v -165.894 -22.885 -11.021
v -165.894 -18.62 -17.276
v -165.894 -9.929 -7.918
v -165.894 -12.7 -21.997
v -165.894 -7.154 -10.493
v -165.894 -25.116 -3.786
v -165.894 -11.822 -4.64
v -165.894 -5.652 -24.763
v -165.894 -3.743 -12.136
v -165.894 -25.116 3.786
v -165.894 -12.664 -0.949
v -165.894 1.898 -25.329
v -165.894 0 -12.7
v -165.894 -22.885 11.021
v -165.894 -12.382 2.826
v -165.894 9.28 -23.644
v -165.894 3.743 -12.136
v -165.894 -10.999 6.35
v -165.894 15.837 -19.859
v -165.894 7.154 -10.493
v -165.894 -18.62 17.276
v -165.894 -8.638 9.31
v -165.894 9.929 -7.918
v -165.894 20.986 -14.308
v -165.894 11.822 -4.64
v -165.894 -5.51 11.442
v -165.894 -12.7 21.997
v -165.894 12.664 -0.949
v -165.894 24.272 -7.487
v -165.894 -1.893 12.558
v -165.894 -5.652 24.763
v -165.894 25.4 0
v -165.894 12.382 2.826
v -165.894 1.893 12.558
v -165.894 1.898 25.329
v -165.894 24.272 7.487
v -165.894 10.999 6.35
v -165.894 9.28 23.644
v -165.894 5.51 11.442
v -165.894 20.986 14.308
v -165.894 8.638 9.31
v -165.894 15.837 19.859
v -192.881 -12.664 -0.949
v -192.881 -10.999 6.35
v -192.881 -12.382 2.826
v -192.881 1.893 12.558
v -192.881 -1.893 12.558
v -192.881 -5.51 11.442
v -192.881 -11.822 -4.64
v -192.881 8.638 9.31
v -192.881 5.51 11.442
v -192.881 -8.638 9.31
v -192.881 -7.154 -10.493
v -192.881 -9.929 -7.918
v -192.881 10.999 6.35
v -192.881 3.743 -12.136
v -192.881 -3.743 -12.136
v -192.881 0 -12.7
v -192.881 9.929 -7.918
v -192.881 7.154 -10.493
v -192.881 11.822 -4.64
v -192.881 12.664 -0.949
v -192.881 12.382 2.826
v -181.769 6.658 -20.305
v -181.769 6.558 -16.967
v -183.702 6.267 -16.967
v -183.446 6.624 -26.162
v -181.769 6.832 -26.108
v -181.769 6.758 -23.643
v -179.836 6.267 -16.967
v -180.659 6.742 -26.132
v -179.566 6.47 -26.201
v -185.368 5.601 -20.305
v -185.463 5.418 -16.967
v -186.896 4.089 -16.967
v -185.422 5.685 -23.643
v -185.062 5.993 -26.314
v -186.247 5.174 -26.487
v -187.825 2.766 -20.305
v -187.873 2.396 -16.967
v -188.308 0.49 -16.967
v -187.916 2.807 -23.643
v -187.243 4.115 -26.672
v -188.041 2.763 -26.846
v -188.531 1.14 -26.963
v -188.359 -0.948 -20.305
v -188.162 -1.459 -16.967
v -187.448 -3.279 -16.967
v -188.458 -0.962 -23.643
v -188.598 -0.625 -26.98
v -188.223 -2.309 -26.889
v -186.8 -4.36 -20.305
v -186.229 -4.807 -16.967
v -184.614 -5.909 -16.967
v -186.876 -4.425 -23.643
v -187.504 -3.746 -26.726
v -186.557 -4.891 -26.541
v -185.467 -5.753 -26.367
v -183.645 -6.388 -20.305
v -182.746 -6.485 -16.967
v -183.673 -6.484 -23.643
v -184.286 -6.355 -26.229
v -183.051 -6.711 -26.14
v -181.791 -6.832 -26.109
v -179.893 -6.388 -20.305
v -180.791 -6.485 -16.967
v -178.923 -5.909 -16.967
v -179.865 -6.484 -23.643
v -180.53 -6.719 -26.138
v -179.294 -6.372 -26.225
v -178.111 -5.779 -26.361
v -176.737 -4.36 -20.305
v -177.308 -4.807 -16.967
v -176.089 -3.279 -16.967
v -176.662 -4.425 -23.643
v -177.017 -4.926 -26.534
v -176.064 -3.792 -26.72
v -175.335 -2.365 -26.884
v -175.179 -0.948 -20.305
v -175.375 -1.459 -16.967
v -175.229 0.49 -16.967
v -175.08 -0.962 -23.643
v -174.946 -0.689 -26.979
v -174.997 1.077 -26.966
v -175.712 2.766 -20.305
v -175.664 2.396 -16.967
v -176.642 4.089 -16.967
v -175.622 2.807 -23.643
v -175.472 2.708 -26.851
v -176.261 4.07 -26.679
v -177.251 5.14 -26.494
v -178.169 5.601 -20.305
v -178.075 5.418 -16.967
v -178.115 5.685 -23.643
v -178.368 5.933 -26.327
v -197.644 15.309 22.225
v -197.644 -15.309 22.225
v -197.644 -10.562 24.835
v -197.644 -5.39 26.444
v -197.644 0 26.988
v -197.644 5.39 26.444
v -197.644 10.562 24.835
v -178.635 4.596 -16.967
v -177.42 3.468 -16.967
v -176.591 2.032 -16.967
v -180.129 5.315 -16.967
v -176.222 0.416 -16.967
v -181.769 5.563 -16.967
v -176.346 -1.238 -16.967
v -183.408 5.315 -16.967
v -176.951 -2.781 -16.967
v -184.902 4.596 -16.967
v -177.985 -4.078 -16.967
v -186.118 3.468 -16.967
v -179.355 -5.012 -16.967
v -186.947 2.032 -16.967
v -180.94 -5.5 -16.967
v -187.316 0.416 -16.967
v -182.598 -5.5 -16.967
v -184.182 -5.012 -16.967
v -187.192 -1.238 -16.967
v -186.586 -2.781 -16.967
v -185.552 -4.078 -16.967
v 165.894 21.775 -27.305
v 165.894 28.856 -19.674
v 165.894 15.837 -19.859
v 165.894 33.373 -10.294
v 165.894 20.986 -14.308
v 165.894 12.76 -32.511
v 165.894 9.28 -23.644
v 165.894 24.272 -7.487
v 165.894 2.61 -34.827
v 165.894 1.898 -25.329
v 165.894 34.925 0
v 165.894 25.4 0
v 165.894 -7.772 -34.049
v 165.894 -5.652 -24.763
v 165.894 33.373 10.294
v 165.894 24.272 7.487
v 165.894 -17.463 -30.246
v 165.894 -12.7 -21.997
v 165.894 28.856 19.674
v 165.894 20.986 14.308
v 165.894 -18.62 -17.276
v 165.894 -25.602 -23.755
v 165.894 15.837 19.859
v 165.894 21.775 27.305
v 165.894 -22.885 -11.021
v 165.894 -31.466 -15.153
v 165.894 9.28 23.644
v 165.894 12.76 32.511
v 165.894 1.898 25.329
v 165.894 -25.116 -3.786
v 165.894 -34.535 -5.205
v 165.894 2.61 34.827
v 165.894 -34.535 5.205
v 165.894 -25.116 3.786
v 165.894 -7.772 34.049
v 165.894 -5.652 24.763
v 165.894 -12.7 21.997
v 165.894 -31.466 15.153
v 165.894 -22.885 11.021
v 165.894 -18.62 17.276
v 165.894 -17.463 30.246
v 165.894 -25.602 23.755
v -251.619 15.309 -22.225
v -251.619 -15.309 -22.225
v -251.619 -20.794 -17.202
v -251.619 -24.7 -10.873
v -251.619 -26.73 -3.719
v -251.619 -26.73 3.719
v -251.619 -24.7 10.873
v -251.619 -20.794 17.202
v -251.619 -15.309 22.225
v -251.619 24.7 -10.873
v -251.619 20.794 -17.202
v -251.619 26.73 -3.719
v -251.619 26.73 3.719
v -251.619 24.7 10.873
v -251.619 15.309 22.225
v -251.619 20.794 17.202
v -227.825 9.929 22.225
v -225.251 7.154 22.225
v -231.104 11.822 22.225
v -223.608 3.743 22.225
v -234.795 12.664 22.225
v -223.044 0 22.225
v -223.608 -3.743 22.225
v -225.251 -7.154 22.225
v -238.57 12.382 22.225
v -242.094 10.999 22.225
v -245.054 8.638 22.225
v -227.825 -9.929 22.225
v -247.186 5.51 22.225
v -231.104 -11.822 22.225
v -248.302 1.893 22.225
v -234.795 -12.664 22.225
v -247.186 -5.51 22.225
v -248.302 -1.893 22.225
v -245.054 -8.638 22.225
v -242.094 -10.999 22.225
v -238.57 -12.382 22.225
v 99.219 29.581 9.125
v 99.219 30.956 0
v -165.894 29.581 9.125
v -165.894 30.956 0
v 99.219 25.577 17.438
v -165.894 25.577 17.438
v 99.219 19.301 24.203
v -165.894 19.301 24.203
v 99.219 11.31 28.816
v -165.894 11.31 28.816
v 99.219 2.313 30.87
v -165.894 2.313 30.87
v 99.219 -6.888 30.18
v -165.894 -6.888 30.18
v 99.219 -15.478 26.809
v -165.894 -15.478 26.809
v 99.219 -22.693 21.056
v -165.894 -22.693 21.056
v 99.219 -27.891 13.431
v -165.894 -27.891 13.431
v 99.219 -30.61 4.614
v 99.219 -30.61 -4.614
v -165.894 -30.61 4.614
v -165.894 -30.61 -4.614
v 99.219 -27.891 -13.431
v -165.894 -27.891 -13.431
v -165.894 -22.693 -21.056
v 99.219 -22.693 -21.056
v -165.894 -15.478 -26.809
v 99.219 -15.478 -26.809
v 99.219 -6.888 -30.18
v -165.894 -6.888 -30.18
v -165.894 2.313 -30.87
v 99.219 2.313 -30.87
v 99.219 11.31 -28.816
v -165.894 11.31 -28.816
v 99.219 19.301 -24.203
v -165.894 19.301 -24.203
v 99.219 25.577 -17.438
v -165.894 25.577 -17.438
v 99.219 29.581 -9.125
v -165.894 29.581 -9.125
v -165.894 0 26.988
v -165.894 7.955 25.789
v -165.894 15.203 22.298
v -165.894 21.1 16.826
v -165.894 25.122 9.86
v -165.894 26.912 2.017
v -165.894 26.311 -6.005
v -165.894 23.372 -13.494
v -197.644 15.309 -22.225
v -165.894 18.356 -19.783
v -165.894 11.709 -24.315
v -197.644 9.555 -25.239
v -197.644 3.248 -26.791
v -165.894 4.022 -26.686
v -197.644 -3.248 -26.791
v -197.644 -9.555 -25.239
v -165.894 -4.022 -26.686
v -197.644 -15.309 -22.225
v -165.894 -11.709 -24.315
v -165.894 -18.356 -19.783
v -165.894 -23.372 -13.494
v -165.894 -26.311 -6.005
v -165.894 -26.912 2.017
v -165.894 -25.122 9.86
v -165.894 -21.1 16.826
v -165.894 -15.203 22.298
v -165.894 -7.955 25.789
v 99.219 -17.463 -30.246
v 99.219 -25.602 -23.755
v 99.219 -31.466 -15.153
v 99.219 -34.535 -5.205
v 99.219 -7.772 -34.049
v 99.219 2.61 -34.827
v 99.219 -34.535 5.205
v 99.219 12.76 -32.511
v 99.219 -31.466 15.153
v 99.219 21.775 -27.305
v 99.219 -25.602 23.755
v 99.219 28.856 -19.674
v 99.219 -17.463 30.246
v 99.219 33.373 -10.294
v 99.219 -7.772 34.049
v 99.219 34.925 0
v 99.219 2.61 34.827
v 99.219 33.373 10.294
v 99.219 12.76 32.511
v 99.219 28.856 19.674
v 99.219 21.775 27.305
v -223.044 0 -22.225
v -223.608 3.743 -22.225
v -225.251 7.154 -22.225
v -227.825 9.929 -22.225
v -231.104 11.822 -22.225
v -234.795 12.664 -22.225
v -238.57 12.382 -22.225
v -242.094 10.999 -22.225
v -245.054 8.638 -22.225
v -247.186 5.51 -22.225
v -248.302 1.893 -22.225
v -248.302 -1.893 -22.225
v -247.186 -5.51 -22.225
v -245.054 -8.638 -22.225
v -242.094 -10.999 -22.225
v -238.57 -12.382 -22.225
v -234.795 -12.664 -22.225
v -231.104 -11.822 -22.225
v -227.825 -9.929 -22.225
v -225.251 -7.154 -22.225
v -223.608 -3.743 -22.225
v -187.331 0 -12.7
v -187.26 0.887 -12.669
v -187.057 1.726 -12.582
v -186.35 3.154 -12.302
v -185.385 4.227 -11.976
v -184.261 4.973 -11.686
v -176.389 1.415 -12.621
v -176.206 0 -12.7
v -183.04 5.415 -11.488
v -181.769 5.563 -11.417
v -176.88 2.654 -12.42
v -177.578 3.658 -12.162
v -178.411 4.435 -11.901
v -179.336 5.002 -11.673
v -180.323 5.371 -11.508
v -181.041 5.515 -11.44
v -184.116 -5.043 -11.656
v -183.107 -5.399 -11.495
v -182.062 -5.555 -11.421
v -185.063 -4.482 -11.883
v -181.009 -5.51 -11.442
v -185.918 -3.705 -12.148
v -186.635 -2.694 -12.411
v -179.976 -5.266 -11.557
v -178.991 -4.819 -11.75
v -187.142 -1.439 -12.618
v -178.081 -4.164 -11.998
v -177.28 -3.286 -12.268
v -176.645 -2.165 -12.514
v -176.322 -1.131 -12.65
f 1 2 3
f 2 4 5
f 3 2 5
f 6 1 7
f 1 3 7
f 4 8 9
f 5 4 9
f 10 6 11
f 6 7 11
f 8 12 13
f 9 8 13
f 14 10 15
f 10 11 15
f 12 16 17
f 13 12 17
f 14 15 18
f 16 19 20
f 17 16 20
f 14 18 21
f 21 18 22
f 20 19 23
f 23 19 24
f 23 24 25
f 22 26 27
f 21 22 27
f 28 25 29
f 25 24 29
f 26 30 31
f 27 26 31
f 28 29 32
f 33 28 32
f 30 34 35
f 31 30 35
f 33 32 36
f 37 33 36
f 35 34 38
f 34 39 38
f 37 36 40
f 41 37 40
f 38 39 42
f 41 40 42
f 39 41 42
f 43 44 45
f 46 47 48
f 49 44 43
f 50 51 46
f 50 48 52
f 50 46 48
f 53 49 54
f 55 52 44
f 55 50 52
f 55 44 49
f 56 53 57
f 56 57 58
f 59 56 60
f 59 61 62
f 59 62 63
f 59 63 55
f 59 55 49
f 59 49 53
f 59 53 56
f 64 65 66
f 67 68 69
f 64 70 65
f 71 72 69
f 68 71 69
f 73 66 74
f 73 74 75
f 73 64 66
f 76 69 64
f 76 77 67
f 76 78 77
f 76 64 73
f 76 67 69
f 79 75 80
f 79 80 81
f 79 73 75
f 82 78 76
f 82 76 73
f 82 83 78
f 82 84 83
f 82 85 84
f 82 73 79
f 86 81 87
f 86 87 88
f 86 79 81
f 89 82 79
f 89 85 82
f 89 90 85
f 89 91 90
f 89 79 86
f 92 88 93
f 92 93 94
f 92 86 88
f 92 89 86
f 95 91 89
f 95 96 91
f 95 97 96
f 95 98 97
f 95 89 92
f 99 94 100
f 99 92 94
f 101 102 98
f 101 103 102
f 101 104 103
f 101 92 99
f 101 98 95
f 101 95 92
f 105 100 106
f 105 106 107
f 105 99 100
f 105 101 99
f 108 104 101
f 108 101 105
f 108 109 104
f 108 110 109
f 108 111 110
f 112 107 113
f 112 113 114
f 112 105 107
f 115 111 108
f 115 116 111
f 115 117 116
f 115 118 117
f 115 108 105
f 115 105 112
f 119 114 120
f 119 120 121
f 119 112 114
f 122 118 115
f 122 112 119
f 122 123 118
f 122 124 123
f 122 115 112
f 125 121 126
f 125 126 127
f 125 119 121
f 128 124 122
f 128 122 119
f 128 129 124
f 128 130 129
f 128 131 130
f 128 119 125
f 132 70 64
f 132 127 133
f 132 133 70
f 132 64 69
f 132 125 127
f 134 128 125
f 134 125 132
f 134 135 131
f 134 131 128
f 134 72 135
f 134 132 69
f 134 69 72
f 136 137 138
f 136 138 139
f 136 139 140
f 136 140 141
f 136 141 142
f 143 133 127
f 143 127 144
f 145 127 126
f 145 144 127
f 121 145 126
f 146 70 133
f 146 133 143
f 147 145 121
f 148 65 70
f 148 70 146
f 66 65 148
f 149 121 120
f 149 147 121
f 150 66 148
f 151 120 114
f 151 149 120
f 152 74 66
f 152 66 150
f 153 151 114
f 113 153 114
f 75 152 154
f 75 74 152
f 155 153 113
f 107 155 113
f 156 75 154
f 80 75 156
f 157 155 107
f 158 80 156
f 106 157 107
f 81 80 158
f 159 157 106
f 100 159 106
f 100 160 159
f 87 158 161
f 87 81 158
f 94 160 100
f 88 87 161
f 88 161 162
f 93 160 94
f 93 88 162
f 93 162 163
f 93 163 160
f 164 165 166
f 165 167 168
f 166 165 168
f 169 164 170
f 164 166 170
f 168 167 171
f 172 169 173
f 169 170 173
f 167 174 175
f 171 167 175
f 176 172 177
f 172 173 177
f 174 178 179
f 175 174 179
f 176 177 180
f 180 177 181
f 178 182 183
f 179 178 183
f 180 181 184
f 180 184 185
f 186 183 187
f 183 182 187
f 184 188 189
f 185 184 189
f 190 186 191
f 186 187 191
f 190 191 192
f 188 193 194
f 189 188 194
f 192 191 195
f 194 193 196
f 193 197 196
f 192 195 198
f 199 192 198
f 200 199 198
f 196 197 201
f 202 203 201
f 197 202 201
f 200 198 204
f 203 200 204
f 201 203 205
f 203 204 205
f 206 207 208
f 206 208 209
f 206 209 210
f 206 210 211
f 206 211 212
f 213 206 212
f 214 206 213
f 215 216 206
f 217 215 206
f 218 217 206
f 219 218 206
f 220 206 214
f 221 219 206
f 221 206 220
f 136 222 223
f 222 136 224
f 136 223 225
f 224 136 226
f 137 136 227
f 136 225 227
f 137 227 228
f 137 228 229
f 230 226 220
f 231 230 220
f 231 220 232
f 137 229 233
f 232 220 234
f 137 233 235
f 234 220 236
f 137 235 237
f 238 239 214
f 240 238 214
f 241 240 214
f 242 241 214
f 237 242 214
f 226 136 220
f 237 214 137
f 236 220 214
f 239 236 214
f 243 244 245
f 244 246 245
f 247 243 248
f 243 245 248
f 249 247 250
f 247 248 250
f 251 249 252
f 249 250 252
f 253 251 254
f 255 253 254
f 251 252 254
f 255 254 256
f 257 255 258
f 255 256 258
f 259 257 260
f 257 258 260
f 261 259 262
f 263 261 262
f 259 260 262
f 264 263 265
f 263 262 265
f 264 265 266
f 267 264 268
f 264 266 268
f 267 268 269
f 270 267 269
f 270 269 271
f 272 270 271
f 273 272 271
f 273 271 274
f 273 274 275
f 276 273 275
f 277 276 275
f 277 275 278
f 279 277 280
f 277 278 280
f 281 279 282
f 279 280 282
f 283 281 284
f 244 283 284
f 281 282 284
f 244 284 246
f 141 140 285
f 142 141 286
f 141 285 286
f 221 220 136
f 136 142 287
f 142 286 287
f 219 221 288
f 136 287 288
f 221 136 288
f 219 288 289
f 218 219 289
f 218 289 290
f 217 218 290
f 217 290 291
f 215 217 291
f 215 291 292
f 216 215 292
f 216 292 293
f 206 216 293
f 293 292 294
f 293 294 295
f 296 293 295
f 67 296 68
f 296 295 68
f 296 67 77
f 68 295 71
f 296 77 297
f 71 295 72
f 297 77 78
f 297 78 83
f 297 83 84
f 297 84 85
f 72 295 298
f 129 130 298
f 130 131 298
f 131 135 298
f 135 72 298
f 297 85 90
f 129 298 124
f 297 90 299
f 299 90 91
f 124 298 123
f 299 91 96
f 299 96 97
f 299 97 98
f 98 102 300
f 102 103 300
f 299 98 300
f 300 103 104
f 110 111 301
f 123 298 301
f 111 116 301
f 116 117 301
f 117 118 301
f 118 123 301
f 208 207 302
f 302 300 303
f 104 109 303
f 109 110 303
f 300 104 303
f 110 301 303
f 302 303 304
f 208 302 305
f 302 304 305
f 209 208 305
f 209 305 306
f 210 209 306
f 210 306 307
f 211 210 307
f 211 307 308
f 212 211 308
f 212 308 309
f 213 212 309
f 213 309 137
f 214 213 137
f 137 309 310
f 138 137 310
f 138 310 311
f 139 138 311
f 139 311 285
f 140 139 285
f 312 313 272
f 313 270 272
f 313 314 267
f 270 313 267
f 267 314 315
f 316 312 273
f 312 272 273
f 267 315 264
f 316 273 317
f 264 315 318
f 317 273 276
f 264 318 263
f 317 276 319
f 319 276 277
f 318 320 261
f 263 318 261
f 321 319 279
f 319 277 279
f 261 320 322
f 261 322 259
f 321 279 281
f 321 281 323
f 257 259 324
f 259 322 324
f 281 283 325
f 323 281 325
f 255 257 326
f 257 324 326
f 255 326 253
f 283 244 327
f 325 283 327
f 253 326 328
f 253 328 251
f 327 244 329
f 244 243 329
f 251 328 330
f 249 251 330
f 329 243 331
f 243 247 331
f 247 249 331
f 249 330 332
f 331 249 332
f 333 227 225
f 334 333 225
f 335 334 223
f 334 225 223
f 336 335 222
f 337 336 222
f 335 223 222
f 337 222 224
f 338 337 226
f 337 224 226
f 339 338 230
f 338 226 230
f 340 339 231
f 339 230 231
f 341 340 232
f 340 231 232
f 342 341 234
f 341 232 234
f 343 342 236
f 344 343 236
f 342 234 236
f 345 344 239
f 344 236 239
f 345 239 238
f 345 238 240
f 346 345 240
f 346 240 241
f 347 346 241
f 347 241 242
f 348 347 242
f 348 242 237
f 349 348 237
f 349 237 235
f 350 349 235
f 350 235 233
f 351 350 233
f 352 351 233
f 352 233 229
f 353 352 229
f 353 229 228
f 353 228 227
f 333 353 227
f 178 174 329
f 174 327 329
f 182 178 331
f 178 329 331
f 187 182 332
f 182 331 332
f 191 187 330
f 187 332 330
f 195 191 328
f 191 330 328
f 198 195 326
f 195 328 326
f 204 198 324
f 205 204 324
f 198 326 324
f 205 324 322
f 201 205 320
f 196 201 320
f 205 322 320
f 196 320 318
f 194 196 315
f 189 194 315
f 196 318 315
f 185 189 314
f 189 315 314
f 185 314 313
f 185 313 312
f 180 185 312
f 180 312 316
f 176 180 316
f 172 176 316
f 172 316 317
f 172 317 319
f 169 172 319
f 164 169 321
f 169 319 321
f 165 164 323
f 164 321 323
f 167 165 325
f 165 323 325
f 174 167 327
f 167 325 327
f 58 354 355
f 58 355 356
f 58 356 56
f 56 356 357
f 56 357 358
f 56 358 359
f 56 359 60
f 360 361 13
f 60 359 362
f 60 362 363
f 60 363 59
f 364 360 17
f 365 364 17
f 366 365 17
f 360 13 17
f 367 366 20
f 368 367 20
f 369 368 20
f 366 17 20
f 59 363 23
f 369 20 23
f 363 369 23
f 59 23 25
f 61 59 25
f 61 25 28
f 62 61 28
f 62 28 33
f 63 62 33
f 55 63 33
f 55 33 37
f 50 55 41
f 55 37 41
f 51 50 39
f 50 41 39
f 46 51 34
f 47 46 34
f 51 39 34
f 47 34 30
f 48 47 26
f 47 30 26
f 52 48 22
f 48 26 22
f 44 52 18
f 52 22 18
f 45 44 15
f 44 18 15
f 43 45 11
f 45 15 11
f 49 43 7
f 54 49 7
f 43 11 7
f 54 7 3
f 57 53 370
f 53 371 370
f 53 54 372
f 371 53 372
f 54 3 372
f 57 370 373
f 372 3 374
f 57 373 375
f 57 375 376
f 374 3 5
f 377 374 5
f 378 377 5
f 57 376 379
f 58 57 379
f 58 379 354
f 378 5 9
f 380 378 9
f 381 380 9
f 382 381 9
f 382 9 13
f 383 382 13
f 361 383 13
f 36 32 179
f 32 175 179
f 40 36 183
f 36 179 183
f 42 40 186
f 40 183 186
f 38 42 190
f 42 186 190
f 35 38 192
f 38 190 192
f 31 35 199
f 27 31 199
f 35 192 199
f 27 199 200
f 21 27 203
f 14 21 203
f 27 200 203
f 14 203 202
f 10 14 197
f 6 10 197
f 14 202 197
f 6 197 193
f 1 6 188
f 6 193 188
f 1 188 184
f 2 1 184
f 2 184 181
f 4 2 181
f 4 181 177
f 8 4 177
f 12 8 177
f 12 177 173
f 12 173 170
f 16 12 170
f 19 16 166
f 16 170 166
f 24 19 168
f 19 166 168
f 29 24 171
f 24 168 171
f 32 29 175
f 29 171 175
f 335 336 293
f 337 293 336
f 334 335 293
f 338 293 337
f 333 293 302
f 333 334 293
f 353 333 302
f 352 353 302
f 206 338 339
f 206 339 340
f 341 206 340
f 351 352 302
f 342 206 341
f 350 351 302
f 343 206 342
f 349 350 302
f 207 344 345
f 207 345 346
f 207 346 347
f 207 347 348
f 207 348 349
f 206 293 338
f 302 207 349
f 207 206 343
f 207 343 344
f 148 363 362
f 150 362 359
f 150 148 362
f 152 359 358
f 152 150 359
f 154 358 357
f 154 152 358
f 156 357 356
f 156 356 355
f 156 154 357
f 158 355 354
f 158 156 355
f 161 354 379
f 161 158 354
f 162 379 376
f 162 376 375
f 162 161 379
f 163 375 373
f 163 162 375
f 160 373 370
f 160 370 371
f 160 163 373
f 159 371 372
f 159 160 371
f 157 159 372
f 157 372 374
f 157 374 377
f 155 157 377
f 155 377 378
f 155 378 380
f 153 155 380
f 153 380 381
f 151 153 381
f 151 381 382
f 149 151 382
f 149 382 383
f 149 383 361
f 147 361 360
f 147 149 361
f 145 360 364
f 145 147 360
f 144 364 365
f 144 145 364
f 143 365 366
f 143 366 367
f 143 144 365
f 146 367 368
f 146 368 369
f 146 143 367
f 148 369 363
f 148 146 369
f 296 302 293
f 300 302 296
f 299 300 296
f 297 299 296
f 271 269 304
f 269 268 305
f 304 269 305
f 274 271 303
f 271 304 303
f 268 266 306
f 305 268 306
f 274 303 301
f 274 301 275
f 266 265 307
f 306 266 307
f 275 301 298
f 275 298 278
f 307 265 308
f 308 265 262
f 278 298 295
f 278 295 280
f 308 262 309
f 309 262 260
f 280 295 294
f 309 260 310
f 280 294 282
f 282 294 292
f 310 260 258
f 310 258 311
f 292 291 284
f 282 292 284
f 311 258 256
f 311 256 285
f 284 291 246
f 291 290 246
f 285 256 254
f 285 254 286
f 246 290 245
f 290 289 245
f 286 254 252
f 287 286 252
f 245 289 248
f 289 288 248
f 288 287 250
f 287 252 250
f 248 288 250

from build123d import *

# Parameters (mm, degrees)
SKETCH2_R           = 26.9875
BOSS_EXTRUDE1_DEPTH = 85.725
CUT_EXTRUDE1_DEPTH  = 53.975
SKETCH4_R           = 12.7
CUT_EXTRUDE2_DEPTH  = 58.15
SKETCH8_R           = 12.7
CUT_EXTRUDE3_DEPTH  = 26.9875


with BuildPart() as part:
    # Sketch1 → Revolve1 (revolve)
    with BuildSketch(Plane.XY):
        Polygon((165.89375, 34.925), (99.21875, 34.925), (99.21875, 30.95625), (-165.89375, 30.95625), (-165.89375, 25.4), (165.89375, 25.4), align=None)
    revolve(axis=Axis((-165.89375, 0, 0), (1, 0, 0)))

    # Sketch2 → Boss-Extrude1 (add)
    with BuildSketch(Plane.ZY.offset(165.89375)):
        Circle(SKETCH2_R)
    extrude(amount=BOSS_EXTRUDE1_DEPTH)

    # Sketch3 → Cut-Extrude1 (cut)
    with BuildSketch(Plane.ZY.offset(251.61875)):
        with BuildLine():
            Line((-22.225, 15.309295583), (-22.225, -15.309295583))
            ThreePointArc((-22.225, -15.309295583), (-26.9875, 0), (-22.225, 15.309295583))
        make_face()
        with BuildLine():
            Line((22.225, 15.309295583), (22.225, -15.309295583))
            ThreePointArc((22.225, -15.309295583), (26.9875, 0), (22.225, 15.309295583))
        make_face()
    extrude(amount=-CUT_EXTRUDE1_DEPTH, mode=Mode.SUBTRACT)

    # Sketch4 → Cut-Extrude2 (cut, through all)
    with BuildSketch(Plane.XY.offset(22.225)):
        with Locations((-235.74375, 0)):
            Circle(SKETCH4_R)
    extrude(amount=-CUT_EXTRUDE2_DEPTH, mode=Mode.SUBTRACT)

    # Sketch6 → 1/4 NPT Tapped Hole1 (revolve, cut)
    with BuildSketch(Plane(origin=(-181.76875, 0, -26.9875), x_dir=(0, 1, 0), z_dir=(1, 0, 0))):
        Polygon((0, 0), (0, 20.411147279), (5.5626, 17.0688), (5.5626, 10.0203), (6.557978799, 10.0203), (6.858, 0), align=None)
    revolve(axis=Axis((-181.76875, 0, -33.3375), (0, 0, 1)), mode=Mode.SUBTRACT)

    # Sketch8 → Cut-Extrude3 (cut)
    with BuildSketch(Plane(origin=(-165.89375, 0, 0), x_dir=(0, 0, -1), z_dir=(1, 0, 0))):
        Circle(SKETCH8_R)
    extrude(amount=-CUT_EXTRUDE3_DEPTH, mode=Mode.SUBTRACT)


solid = part.part
